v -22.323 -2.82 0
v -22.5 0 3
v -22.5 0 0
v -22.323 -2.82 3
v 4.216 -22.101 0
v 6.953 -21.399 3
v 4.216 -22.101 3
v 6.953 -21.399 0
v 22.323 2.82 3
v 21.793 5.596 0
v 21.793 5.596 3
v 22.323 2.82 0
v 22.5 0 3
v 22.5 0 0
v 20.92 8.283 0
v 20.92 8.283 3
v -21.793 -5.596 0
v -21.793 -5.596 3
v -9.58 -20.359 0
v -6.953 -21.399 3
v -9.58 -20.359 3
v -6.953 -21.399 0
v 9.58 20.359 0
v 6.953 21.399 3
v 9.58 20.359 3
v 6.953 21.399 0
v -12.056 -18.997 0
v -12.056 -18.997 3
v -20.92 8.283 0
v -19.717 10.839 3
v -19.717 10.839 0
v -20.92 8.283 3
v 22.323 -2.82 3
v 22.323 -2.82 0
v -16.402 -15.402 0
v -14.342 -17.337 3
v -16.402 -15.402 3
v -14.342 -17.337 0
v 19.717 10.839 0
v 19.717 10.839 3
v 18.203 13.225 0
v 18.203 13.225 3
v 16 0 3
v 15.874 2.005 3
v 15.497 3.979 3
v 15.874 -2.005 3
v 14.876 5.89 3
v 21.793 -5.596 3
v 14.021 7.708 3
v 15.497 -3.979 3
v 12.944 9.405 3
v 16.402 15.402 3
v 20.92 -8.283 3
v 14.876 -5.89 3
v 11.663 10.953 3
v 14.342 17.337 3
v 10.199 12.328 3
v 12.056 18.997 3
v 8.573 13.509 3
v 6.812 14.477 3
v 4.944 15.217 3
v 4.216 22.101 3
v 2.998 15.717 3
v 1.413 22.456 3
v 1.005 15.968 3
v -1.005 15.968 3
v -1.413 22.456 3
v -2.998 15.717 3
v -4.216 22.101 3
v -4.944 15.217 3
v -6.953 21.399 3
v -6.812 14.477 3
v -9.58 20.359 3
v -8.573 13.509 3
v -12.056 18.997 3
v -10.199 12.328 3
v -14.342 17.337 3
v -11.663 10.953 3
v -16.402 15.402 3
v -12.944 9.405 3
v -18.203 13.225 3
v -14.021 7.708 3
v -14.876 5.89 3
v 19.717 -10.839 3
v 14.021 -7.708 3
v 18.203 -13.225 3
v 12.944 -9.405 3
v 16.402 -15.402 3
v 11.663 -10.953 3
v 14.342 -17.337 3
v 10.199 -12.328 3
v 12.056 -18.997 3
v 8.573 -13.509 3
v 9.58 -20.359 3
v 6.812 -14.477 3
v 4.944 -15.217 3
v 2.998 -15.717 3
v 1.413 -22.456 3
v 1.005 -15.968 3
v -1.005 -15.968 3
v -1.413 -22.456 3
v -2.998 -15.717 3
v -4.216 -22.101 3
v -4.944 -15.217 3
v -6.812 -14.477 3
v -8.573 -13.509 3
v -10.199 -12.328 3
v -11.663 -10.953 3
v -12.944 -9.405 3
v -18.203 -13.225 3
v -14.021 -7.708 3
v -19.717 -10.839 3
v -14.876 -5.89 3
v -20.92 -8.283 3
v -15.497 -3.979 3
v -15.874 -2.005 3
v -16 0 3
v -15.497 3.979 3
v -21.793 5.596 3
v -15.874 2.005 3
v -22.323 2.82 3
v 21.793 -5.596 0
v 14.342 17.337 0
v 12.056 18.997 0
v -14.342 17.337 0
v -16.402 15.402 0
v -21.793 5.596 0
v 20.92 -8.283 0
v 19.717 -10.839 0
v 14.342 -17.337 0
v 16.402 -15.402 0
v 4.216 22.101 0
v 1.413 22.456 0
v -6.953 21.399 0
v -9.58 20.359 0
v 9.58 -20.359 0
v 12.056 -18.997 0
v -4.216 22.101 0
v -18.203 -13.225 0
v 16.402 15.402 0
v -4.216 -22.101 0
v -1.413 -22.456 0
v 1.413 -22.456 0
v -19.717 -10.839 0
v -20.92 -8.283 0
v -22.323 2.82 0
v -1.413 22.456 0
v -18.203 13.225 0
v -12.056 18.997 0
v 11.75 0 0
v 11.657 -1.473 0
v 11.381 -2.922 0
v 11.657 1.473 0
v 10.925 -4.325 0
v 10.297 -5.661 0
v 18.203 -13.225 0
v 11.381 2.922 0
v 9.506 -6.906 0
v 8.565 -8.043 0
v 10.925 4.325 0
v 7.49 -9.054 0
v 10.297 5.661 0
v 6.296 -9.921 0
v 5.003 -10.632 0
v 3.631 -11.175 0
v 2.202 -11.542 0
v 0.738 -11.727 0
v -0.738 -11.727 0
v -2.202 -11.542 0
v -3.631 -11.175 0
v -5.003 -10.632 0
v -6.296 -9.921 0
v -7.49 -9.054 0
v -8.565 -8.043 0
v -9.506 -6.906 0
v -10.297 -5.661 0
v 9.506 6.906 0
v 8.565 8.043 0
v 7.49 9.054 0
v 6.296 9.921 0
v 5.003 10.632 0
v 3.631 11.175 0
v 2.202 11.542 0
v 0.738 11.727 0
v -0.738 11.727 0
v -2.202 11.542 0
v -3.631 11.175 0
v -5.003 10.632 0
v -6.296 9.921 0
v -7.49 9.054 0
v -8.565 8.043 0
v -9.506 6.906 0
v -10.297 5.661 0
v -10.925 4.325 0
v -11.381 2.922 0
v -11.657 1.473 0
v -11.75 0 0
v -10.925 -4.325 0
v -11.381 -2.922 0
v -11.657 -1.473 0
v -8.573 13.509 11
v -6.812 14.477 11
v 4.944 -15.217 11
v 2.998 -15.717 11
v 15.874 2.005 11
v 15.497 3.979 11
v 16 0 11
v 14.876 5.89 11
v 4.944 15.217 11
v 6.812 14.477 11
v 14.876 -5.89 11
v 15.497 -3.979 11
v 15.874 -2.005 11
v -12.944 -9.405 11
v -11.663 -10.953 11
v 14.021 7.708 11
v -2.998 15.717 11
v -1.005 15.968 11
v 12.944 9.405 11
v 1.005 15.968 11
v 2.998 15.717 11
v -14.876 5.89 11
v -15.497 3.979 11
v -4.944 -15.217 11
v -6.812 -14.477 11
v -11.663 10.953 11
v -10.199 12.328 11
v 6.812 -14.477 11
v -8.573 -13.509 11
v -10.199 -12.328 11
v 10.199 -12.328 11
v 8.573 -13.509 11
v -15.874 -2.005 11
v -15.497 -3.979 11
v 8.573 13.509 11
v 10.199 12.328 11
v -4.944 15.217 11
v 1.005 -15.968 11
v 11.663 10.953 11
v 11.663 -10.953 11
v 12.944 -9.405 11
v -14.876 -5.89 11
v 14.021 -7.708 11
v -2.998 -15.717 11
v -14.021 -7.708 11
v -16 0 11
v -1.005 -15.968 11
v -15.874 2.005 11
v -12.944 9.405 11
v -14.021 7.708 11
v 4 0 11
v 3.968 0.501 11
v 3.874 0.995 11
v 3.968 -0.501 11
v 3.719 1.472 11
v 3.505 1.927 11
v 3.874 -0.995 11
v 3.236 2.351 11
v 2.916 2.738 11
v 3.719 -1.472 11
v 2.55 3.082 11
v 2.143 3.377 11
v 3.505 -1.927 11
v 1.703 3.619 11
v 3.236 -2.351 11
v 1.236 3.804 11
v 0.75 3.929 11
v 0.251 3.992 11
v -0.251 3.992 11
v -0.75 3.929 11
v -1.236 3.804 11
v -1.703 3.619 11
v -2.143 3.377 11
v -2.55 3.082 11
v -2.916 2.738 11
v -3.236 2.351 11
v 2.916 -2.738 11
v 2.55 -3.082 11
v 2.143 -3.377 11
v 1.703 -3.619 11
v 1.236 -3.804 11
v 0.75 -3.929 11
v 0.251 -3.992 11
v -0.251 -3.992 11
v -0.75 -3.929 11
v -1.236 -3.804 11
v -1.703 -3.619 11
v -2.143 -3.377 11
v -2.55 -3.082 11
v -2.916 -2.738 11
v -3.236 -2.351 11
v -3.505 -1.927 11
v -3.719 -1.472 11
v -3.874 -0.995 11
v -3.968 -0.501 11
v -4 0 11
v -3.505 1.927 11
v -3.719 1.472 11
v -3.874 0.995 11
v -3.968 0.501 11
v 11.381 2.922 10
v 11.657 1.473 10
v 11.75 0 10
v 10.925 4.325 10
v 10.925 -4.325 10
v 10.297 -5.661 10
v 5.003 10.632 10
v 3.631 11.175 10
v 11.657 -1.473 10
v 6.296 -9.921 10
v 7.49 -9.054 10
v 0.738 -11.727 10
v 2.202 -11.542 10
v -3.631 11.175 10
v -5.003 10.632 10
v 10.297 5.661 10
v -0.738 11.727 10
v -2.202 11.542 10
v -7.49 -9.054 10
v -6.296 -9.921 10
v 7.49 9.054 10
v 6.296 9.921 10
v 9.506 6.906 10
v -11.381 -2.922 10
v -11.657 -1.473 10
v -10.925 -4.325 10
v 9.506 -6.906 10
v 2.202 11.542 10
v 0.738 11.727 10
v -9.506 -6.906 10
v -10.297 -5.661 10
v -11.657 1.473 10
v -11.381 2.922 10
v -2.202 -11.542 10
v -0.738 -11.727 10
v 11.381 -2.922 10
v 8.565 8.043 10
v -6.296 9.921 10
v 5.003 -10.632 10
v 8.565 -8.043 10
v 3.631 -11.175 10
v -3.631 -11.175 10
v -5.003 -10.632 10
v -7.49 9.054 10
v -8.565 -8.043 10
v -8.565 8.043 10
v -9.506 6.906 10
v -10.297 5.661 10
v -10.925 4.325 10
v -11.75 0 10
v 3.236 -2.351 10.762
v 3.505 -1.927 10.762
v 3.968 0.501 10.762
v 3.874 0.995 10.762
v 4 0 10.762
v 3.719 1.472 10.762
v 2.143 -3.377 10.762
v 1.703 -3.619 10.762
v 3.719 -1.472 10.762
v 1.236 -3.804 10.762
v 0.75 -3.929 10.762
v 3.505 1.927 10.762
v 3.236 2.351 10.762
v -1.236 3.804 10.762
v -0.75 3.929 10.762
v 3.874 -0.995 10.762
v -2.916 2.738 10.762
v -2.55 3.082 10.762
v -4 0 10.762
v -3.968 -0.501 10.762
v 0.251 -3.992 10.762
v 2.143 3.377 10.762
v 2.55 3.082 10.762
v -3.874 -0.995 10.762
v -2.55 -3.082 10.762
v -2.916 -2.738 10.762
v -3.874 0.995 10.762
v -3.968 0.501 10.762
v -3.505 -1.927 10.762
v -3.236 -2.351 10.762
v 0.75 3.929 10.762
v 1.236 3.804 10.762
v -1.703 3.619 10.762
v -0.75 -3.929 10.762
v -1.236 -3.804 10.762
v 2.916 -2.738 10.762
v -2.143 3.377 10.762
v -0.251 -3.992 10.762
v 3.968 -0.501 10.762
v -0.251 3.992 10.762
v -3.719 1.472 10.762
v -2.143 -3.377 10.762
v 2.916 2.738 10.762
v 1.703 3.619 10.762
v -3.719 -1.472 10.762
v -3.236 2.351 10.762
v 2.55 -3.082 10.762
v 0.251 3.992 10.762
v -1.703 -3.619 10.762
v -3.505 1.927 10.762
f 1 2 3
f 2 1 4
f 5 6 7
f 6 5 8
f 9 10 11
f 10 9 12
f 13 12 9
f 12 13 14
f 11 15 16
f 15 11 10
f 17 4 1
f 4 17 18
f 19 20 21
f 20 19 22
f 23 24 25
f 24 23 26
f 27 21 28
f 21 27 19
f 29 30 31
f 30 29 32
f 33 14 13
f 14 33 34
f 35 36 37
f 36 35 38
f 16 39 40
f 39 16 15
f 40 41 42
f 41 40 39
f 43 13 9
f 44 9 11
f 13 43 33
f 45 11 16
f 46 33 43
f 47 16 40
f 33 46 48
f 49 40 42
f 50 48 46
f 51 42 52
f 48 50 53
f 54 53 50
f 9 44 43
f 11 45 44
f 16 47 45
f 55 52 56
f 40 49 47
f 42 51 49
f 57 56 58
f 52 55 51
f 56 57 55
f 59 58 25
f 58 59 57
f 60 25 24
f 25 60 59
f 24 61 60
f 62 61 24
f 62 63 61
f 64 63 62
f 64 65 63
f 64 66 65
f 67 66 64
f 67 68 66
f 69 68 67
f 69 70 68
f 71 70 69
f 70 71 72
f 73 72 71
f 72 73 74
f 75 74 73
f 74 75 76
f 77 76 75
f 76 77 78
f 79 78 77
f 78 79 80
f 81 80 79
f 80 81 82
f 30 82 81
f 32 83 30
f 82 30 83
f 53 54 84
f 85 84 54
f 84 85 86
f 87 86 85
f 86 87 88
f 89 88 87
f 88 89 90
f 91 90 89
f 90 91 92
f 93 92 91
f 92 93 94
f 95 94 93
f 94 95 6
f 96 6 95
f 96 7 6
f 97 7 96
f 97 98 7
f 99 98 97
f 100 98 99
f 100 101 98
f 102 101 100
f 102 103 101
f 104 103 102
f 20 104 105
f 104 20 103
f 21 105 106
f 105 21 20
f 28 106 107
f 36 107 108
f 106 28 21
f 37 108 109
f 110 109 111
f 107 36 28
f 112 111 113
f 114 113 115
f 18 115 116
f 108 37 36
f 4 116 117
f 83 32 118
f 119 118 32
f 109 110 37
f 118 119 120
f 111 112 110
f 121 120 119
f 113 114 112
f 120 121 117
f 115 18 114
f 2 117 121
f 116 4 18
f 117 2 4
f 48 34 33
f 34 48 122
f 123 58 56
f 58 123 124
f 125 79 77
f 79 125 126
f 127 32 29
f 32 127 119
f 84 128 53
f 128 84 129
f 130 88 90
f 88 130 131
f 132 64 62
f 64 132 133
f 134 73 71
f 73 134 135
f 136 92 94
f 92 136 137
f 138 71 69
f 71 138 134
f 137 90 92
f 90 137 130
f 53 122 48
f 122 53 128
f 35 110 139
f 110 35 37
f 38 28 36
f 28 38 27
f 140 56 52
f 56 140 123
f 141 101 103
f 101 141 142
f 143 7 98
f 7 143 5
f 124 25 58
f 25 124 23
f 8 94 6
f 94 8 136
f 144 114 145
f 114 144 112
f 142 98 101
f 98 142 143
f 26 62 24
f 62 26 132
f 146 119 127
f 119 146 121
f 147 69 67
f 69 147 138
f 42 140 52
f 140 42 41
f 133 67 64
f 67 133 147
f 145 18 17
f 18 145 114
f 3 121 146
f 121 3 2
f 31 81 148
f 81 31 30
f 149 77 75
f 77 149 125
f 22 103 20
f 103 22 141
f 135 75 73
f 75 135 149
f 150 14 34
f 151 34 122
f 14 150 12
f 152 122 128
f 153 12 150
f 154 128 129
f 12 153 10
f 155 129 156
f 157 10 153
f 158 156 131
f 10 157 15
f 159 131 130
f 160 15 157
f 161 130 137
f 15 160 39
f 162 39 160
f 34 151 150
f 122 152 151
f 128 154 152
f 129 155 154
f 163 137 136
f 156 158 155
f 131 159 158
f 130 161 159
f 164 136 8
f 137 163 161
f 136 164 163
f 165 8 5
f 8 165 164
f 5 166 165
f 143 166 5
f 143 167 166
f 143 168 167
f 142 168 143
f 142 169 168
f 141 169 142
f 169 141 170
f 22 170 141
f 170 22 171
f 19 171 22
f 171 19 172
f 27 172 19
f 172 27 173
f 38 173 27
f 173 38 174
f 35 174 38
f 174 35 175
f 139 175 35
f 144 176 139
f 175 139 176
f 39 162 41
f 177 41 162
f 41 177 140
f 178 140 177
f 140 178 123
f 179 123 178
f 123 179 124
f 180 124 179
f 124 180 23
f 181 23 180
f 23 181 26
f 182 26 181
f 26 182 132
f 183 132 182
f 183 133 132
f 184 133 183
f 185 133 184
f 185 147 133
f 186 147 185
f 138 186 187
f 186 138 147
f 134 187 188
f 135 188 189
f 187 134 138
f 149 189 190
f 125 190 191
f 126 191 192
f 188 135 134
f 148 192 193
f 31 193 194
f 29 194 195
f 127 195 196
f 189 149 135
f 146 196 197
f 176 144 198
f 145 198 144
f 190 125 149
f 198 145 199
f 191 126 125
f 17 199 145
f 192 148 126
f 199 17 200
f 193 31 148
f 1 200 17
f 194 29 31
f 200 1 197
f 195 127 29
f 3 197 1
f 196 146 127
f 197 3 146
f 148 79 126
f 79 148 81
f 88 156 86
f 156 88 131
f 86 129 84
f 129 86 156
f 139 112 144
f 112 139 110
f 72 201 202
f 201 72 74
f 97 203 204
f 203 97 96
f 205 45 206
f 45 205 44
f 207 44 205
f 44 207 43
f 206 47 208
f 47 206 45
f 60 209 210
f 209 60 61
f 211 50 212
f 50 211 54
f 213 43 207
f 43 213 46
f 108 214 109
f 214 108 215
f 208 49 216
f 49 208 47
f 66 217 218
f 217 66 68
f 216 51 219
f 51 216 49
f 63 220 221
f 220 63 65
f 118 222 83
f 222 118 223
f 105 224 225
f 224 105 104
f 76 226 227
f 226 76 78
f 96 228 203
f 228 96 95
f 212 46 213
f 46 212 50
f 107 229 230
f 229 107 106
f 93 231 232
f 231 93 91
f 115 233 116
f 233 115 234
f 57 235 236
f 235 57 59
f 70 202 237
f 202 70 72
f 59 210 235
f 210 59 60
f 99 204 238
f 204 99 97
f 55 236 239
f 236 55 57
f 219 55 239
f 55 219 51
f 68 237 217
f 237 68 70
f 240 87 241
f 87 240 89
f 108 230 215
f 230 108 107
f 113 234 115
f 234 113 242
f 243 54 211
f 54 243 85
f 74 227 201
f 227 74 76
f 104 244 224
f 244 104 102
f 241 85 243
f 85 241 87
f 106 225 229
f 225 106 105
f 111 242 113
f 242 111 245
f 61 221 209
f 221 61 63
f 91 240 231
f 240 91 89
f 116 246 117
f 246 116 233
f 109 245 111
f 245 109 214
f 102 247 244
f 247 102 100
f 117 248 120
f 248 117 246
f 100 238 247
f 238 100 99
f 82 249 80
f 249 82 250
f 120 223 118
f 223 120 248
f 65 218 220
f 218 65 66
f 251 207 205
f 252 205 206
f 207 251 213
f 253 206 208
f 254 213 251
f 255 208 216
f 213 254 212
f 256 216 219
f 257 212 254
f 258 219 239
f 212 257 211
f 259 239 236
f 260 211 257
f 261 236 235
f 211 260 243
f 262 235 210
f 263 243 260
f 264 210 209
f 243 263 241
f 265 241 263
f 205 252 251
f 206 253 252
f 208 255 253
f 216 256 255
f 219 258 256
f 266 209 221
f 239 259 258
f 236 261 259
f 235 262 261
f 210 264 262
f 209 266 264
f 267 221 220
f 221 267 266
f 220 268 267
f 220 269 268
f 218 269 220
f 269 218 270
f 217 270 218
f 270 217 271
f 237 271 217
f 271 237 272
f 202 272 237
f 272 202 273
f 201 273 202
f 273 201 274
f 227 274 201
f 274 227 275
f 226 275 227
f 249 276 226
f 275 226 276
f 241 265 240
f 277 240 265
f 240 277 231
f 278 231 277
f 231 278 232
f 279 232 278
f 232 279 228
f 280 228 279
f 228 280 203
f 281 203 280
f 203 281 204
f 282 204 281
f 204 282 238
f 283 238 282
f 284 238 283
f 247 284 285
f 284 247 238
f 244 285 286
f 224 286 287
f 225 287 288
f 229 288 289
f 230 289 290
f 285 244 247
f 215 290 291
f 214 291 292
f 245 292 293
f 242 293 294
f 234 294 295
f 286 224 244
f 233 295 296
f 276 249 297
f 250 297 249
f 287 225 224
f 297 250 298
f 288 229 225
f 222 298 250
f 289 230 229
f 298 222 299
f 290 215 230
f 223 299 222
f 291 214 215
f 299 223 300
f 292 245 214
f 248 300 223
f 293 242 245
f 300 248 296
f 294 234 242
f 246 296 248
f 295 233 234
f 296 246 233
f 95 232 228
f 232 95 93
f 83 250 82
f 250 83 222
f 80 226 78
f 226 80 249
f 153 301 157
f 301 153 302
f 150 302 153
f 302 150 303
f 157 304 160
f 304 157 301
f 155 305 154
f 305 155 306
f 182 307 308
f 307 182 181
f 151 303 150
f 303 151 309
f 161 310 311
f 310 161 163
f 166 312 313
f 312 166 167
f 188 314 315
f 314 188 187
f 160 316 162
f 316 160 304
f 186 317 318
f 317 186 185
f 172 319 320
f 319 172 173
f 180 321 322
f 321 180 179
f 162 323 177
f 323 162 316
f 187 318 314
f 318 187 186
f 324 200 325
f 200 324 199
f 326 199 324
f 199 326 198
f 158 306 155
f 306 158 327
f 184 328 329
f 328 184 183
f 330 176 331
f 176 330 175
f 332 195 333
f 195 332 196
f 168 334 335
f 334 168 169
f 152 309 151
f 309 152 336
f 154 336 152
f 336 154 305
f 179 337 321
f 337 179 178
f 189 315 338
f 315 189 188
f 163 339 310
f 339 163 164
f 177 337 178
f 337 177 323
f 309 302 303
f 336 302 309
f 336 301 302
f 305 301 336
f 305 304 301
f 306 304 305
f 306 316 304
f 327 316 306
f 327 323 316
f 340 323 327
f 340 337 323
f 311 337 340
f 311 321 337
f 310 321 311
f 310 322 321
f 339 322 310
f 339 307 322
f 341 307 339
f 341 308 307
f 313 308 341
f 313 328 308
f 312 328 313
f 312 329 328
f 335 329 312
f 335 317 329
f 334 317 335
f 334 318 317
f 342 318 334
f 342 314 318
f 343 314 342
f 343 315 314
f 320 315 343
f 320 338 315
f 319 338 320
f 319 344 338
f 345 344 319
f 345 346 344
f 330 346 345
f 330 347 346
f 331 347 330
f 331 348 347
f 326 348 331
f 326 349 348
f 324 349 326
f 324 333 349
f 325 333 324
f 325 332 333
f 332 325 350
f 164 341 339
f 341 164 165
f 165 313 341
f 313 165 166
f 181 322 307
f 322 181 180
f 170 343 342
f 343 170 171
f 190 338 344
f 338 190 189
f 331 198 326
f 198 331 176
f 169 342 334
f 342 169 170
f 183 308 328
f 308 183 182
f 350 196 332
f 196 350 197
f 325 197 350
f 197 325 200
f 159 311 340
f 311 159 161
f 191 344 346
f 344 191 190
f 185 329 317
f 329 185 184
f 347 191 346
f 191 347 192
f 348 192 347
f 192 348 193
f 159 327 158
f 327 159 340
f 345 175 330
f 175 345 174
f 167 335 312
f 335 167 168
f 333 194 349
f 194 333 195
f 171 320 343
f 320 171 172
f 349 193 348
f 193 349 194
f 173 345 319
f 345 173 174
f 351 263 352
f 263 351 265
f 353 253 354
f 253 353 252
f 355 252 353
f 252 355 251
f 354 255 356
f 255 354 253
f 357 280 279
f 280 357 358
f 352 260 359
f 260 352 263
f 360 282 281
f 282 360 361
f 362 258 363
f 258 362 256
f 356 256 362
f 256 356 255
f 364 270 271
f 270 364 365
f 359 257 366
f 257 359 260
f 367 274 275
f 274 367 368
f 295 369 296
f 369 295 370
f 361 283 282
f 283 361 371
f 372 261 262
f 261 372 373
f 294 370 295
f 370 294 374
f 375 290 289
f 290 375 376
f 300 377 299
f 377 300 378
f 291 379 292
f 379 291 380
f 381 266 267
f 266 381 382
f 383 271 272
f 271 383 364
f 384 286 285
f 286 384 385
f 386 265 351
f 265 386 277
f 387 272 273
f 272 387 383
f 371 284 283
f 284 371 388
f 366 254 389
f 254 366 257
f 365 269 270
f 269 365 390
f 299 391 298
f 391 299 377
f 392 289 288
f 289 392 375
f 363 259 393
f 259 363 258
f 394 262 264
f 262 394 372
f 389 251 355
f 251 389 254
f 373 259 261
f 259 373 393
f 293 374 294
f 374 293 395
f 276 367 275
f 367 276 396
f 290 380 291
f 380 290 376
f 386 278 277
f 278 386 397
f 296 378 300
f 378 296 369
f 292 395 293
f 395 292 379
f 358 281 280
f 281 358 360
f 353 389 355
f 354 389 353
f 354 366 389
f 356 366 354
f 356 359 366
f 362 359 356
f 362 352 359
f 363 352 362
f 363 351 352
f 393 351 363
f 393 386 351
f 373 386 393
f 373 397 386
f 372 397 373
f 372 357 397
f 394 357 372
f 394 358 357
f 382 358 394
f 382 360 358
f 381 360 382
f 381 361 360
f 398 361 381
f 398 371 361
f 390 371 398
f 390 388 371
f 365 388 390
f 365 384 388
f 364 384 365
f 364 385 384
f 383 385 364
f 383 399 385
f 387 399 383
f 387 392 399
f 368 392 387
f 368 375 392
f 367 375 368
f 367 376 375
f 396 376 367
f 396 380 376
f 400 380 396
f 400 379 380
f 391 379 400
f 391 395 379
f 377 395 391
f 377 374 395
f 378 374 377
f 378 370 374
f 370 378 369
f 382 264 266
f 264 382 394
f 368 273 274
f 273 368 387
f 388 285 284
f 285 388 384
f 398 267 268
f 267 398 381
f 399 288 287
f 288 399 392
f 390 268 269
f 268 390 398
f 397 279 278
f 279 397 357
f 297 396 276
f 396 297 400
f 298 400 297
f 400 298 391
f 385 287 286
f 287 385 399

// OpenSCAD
/* spindle bearing adapter for Filament spools
	 by Kevin Osborn 
*/
// dimensions in mm
// How far into the spindle you want the hub
Spindle_length = 8;
// The size of your hole
Spindle_diameter = 32;
// Diameter of your axel/threaded rod
Axel_diameter = 8;
// Thickness in mm of the brim
Brim_height = 3;
// Width of the brim outside the spindle
Brim_width =13;//[0:50]
/* [Advanced] */
Layer_height = .254;
skate_recess_height = 10;
inner_wall_thick = Layer_height *3;
/* [Hidden] */
Brim_diameter = Spindle_diameter+Brim_width;
$fn=50;

difference()
{
  union()// the outside hat
   {
   cylinder(Brim_height,Brim_diameter/2,Brim_diameter/2);	
   translate ([0,0,Brim_height]) cylinder (Spindle_length,Spindle_diameter/2,Spindle_diameter/2);//Spindle part
	
   }
   union()
    {
    cylinder(skate_recess_height,11.75,11.75); // skate bearing recess
    translate([0,0,skate_recess_height +inner_wall_thick]) cylinder(Spindle_length+Brim_height,Axel_diameter/2,Axel_diameter/2);
    }

}
